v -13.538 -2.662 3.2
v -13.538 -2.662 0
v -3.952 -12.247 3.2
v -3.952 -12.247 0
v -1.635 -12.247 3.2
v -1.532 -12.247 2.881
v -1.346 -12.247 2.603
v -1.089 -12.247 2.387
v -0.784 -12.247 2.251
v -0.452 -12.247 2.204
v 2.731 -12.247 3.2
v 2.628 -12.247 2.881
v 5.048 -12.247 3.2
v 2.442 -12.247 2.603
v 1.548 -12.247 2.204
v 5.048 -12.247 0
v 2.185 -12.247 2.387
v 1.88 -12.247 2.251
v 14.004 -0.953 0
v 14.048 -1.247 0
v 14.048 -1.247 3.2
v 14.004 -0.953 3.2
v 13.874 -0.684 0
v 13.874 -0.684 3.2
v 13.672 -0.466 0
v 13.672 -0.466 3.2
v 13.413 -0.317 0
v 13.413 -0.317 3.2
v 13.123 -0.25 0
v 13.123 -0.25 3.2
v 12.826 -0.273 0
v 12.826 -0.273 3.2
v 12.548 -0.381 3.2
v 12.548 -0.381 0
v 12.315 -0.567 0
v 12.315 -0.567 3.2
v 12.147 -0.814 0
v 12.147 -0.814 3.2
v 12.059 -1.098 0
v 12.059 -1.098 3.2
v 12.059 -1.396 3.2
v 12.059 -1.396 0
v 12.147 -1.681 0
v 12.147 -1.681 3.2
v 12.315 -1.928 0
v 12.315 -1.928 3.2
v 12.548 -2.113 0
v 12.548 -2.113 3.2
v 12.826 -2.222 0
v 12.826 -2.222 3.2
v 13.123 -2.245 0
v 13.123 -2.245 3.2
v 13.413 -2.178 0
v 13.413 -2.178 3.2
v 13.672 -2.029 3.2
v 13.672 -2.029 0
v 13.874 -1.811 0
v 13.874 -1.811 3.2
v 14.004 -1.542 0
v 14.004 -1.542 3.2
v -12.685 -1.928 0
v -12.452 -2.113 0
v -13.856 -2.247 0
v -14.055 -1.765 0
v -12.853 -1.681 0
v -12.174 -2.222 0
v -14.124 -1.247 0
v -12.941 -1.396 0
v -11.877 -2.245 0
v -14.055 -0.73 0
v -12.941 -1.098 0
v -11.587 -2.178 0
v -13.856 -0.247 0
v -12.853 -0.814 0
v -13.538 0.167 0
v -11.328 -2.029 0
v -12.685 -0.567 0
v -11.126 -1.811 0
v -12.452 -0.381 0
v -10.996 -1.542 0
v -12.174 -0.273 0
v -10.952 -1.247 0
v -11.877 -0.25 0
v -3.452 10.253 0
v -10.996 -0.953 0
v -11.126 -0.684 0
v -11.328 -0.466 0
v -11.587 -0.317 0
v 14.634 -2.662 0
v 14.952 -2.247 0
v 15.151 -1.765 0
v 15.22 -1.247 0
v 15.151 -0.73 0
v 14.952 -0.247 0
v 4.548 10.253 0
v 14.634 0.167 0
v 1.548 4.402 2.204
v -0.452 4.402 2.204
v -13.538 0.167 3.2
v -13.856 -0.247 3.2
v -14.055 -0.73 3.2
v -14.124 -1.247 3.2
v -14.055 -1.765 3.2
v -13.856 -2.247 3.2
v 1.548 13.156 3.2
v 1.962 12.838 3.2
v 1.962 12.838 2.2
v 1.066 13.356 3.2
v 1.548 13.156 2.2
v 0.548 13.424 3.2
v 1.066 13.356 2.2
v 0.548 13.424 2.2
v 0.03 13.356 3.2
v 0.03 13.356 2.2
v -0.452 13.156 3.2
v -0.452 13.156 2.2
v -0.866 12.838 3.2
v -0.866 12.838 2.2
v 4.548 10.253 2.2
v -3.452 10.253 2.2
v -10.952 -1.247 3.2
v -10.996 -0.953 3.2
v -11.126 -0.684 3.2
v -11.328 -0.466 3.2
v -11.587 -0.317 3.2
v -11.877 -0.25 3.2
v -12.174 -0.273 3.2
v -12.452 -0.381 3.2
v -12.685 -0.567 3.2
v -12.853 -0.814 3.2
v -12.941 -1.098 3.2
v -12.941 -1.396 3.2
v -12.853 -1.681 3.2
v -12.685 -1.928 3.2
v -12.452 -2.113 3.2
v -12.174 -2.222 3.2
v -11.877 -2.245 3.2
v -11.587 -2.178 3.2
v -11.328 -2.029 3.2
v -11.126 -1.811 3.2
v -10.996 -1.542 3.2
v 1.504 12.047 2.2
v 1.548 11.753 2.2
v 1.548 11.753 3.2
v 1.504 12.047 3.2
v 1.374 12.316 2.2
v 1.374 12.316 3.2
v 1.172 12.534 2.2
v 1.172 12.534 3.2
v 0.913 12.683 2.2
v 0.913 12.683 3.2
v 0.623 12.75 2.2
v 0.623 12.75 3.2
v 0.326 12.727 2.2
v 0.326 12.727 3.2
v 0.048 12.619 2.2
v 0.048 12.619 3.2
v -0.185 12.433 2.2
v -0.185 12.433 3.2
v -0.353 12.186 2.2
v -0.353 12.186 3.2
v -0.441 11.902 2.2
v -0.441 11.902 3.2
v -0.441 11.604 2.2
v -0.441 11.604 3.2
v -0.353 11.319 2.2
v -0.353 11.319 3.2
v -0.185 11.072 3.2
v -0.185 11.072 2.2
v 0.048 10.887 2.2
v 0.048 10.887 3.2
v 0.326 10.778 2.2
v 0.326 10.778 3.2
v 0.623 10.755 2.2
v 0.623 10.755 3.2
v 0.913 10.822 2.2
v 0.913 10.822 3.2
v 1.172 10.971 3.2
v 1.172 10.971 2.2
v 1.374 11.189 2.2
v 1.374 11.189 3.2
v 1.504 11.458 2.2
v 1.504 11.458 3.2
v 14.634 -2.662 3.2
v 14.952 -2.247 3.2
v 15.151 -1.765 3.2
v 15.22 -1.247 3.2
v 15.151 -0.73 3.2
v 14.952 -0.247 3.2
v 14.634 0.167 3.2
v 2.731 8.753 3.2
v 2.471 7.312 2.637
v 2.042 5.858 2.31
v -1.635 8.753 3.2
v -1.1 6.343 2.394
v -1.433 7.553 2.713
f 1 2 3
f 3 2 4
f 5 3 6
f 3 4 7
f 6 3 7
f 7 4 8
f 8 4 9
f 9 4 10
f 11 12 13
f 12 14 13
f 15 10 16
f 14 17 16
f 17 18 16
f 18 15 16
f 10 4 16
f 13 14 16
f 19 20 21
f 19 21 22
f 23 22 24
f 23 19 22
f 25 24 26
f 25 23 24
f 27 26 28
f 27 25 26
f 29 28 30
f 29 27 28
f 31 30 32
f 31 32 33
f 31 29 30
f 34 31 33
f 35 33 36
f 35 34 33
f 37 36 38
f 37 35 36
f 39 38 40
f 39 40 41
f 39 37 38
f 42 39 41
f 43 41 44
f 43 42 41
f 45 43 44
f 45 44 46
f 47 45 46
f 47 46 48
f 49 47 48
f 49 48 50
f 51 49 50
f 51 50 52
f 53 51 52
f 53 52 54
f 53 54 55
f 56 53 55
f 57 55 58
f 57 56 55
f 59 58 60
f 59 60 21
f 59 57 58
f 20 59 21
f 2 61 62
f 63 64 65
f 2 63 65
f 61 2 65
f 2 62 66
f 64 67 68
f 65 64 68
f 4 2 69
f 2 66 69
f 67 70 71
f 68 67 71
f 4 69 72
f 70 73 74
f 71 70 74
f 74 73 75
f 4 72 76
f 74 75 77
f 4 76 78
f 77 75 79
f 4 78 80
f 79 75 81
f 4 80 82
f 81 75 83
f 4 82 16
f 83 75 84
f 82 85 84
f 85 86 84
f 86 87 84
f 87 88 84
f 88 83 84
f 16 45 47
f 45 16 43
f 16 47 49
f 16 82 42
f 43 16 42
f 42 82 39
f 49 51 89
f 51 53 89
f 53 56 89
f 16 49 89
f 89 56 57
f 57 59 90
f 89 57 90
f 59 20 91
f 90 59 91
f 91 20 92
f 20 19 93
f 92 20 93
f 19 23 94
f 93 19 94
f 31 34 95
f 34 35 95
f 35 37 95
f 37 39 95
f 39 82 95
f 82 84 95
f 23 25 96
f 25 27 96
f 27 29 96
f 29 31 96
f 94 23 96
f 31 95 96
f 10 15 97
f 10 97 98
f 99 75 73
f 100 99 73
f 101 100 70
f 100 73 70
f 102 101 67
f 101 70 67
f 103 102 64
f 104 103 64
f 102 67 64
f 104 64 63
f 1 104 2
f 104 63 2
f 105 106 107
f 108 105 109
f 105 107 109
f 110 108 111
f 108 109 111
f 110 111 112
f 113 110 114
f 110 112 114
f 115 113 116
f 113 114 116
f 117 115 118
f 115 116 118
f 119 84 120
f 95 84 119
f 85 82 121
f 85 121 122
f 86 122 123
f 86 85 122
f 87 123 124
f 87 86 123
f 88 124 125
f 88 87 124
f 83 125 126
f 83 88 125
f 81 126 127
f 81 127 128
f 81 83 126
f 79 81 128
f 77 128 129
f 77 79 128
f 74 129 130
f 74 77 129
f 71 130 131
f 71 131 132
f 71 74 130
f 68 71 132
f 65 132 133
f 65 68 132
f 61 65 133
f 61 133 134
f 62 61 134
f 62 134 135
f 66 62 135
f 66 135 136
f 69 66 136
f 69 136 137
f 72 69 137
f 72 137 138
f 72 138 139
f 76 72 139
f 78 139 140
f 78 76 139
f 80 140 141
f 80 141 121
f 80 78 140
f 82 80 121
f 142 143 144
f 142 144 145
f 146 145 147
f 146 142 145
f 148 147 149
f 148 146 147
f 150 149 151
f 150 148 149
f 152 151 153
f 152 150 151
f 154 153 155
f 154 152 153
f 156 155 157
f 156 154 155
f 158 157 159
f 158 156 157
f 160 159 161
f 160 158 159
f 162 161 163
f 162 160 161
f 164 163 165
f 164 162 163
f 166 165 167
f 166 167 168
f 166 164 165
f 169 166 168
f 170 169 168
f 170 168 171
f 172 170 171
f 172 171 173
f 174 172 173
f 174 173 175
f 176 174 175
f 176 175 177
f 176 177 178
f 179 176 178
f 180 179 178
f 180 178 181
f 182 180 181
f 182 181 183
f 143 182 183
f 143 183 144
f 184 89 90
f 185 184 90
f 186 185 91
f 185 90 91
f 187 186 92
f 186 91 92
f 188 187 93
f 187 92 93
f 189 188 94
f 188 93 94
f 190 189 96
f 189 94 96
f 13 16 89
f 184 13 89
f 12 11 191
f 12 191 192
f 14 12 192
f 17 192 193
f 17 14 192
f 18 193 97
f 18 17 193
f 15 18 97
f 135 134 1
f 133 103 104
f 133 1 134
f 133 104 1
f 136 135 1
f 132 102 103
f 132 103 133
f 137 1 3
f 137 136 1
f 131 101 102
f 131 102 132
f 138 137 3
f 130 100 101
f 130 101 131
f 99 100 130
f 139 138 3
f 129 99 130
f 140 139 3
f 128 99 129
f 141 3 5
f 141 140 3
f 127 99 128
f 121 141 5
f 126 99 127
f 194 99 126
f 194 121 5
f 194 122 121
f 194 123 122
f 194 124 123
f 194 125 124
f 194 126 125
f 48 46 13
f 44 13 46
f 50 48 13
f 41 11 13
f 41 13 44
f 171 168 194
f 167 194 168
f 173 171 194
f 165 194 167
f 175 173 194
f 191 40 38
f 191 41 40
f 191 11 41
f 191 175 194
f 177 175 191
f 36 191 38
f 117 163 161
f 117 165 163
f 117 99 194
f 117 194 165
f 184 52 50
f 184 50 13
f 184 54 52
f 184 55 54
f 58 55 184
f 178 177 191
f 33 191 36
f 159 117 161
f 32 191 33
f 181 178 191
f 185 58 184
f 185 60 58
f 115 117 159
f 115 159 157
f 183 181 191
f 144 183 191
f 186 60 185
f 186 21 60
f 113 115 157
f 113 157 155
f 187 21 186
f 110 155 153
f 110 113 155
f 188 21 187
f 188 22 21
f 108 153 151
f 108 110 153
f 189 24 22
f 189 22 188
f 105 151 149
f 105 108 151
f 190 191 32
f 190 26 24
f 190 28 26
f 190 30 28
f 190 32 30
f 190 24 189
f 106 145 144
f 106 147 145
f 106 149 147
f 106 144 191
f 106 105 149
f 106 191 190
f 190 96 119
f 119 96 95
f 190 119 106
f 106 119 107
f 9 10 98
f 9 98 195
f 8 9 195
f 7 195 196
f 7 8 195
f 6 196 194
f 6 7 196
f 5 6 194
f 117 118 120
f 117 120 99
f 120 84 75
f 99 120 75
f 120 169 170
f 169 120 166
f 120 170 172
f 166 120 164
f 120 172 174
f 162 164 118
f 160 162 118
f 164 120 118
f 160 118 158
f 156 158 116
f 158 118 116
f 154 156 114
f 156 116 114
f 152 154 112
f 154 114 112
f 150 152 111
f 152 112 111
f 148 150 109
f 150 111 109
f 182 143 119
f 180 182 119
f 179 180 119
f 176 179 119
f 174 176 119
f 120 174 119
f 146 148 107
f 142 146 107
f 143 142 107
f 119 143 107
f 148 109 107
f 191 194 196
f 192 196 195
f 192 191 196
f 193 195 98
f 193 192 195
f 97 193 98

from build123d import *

# Parameters (mm, degrees)
SKETCH1_R           = 1
BOSS_EXTRUDE1_DEPTH = 3.2
CUT_EXTRUDE1_DEPTH  = 21
FILLET1_R           = 10
CUT_EXTRUDE3_DEPTH  = 2.2


with BuildPart() as part:
    # Sketch1 → Boss-Extrude1 (new body)
    with BuildSketch(Plane.XY):
        with BuildLine():
            Line((-13.537758799, -2.661648107), (-3.951972362, -12.247434544))
            Line((-3.951972362, -12.247434544), (5.048027638, -12.247434544))
            Line((5.048027638, -12.247434544), (14.633814076, -2.661648107))
            ThreePointArc((14.633814076, -2.661648107), (15.219600513, -1.247434544), (14.633814076, 0.166779018))
            Line((14.633814076, 0.166779018), (1.962241201, 12.838351893))
            ThreePointArc((1.962241201, 12.838351893), (0.548027638, 13.424138331), (-0.866185924, 12.838351893))
            Line((-0.866185924, 12.838351893), (-13.537758799, 0.166779018))
            ThreePointArc((-13.537758799, 0.166779018), (-14.123545237, -1.247434544), (-13.537758799, -2.661648107))
        make_face()
        with Locations((-11.951972362, -1.247434544)):
            Circle(SKETCH1_R, mode=Mode.SUBTRACT)
        with Locations((13.048027638, -1.247434544)):
            Circle(SKETCH1_R, mode=Mode.SUBTRACT)
        with Locations((0.548027638, 11.752565456)):
            Circle(SKETCH1_R, mode=Mode.SUBTRACT)
    extrude(amount=BOSS_EXTRUDE1_DEPTH)

    # Sketch2 → Cut-Extrude1 (cut)
    with BuildSketch(Plane.XZ.offset(12.247434544)):
        with BuildLine():
            Line((-0.451972362, 4.603907064), (1.548027638, 4.603907064))
            ThreePointArc((1.548027638, 4.603907064), (2.748027638, 3.403907064), (1.548027638, 2.203907064))
            Line((1.548027638, 2.203907064), (-0.451972362, 2.203907064))
            ThreePointArc((-0.451972362, 2.203907064), (-1.651972362, 3.403907064), (-0.451972362, 4.603907064))
        make_face()
    extrude(amount=-CUT_EXTRUDE1_DEPTH, mode=Mode.SUBTRACT)

    # Fillet1
    # the kernel refuses this fillet: 10 mm, written as the material it adds along each edge
    with BuildSketch(Plane(origin=(12.425084222, 8.752565456, 2.203907064), x_dir=(0, -1, 0), z_dir=(-1, 0, 0))) as fillet1_piece_1_section:
        with BuildLine():
            CenterArc((4.350822634, 10), FILLET1_R, 244.209471462, 25.790528538)
            Line((0, 0.996092936), (0, 0))
            Line((0, 0), (4.350822634, 0))
        make_face()
    fillet1_piece_1 = extrude(amount=23.754113168, mode=Mode.PRIVATE)
    fillet1_piece_1 = split(fillet1_piece_1, bisect_by=Plane(origin=(-2.713667021, 10.990870796, 2.436615037), z_dir=(0.7071067811865476, -0.7071067811865475, 0)), keep=Keep.TOP, mode=Mode.PRIVATE)
    fillet1_piece_1 = split(fillet1_piece_1, bisect_by=Plane(origin=(4.900996749, 9.899596345, 2.436615037), z_dir=(-0.7071067811865476, -0.7071067811865476, 0)), keep=Keep.TOP, mode=Mode.PRIVATE)
    add(fillet1_piece_1)

    # Sketch5 → Cut-Extrude3 (cut)
    with BuildSketch(Plane(origin=(0, 0, 0), x_dir=(-1, 0, 0), z_dir=(0, 0, -1))):
        Polygon((-4.548027638, 10.252565456), (-0.548027638, 14.252565456), (3.451972362, 10.252565456), align=None)
    extrude(amount=-CUT_EXTRUDE3_DEPTH, mode=Mode.SUBTRACT)


solid = part.part
